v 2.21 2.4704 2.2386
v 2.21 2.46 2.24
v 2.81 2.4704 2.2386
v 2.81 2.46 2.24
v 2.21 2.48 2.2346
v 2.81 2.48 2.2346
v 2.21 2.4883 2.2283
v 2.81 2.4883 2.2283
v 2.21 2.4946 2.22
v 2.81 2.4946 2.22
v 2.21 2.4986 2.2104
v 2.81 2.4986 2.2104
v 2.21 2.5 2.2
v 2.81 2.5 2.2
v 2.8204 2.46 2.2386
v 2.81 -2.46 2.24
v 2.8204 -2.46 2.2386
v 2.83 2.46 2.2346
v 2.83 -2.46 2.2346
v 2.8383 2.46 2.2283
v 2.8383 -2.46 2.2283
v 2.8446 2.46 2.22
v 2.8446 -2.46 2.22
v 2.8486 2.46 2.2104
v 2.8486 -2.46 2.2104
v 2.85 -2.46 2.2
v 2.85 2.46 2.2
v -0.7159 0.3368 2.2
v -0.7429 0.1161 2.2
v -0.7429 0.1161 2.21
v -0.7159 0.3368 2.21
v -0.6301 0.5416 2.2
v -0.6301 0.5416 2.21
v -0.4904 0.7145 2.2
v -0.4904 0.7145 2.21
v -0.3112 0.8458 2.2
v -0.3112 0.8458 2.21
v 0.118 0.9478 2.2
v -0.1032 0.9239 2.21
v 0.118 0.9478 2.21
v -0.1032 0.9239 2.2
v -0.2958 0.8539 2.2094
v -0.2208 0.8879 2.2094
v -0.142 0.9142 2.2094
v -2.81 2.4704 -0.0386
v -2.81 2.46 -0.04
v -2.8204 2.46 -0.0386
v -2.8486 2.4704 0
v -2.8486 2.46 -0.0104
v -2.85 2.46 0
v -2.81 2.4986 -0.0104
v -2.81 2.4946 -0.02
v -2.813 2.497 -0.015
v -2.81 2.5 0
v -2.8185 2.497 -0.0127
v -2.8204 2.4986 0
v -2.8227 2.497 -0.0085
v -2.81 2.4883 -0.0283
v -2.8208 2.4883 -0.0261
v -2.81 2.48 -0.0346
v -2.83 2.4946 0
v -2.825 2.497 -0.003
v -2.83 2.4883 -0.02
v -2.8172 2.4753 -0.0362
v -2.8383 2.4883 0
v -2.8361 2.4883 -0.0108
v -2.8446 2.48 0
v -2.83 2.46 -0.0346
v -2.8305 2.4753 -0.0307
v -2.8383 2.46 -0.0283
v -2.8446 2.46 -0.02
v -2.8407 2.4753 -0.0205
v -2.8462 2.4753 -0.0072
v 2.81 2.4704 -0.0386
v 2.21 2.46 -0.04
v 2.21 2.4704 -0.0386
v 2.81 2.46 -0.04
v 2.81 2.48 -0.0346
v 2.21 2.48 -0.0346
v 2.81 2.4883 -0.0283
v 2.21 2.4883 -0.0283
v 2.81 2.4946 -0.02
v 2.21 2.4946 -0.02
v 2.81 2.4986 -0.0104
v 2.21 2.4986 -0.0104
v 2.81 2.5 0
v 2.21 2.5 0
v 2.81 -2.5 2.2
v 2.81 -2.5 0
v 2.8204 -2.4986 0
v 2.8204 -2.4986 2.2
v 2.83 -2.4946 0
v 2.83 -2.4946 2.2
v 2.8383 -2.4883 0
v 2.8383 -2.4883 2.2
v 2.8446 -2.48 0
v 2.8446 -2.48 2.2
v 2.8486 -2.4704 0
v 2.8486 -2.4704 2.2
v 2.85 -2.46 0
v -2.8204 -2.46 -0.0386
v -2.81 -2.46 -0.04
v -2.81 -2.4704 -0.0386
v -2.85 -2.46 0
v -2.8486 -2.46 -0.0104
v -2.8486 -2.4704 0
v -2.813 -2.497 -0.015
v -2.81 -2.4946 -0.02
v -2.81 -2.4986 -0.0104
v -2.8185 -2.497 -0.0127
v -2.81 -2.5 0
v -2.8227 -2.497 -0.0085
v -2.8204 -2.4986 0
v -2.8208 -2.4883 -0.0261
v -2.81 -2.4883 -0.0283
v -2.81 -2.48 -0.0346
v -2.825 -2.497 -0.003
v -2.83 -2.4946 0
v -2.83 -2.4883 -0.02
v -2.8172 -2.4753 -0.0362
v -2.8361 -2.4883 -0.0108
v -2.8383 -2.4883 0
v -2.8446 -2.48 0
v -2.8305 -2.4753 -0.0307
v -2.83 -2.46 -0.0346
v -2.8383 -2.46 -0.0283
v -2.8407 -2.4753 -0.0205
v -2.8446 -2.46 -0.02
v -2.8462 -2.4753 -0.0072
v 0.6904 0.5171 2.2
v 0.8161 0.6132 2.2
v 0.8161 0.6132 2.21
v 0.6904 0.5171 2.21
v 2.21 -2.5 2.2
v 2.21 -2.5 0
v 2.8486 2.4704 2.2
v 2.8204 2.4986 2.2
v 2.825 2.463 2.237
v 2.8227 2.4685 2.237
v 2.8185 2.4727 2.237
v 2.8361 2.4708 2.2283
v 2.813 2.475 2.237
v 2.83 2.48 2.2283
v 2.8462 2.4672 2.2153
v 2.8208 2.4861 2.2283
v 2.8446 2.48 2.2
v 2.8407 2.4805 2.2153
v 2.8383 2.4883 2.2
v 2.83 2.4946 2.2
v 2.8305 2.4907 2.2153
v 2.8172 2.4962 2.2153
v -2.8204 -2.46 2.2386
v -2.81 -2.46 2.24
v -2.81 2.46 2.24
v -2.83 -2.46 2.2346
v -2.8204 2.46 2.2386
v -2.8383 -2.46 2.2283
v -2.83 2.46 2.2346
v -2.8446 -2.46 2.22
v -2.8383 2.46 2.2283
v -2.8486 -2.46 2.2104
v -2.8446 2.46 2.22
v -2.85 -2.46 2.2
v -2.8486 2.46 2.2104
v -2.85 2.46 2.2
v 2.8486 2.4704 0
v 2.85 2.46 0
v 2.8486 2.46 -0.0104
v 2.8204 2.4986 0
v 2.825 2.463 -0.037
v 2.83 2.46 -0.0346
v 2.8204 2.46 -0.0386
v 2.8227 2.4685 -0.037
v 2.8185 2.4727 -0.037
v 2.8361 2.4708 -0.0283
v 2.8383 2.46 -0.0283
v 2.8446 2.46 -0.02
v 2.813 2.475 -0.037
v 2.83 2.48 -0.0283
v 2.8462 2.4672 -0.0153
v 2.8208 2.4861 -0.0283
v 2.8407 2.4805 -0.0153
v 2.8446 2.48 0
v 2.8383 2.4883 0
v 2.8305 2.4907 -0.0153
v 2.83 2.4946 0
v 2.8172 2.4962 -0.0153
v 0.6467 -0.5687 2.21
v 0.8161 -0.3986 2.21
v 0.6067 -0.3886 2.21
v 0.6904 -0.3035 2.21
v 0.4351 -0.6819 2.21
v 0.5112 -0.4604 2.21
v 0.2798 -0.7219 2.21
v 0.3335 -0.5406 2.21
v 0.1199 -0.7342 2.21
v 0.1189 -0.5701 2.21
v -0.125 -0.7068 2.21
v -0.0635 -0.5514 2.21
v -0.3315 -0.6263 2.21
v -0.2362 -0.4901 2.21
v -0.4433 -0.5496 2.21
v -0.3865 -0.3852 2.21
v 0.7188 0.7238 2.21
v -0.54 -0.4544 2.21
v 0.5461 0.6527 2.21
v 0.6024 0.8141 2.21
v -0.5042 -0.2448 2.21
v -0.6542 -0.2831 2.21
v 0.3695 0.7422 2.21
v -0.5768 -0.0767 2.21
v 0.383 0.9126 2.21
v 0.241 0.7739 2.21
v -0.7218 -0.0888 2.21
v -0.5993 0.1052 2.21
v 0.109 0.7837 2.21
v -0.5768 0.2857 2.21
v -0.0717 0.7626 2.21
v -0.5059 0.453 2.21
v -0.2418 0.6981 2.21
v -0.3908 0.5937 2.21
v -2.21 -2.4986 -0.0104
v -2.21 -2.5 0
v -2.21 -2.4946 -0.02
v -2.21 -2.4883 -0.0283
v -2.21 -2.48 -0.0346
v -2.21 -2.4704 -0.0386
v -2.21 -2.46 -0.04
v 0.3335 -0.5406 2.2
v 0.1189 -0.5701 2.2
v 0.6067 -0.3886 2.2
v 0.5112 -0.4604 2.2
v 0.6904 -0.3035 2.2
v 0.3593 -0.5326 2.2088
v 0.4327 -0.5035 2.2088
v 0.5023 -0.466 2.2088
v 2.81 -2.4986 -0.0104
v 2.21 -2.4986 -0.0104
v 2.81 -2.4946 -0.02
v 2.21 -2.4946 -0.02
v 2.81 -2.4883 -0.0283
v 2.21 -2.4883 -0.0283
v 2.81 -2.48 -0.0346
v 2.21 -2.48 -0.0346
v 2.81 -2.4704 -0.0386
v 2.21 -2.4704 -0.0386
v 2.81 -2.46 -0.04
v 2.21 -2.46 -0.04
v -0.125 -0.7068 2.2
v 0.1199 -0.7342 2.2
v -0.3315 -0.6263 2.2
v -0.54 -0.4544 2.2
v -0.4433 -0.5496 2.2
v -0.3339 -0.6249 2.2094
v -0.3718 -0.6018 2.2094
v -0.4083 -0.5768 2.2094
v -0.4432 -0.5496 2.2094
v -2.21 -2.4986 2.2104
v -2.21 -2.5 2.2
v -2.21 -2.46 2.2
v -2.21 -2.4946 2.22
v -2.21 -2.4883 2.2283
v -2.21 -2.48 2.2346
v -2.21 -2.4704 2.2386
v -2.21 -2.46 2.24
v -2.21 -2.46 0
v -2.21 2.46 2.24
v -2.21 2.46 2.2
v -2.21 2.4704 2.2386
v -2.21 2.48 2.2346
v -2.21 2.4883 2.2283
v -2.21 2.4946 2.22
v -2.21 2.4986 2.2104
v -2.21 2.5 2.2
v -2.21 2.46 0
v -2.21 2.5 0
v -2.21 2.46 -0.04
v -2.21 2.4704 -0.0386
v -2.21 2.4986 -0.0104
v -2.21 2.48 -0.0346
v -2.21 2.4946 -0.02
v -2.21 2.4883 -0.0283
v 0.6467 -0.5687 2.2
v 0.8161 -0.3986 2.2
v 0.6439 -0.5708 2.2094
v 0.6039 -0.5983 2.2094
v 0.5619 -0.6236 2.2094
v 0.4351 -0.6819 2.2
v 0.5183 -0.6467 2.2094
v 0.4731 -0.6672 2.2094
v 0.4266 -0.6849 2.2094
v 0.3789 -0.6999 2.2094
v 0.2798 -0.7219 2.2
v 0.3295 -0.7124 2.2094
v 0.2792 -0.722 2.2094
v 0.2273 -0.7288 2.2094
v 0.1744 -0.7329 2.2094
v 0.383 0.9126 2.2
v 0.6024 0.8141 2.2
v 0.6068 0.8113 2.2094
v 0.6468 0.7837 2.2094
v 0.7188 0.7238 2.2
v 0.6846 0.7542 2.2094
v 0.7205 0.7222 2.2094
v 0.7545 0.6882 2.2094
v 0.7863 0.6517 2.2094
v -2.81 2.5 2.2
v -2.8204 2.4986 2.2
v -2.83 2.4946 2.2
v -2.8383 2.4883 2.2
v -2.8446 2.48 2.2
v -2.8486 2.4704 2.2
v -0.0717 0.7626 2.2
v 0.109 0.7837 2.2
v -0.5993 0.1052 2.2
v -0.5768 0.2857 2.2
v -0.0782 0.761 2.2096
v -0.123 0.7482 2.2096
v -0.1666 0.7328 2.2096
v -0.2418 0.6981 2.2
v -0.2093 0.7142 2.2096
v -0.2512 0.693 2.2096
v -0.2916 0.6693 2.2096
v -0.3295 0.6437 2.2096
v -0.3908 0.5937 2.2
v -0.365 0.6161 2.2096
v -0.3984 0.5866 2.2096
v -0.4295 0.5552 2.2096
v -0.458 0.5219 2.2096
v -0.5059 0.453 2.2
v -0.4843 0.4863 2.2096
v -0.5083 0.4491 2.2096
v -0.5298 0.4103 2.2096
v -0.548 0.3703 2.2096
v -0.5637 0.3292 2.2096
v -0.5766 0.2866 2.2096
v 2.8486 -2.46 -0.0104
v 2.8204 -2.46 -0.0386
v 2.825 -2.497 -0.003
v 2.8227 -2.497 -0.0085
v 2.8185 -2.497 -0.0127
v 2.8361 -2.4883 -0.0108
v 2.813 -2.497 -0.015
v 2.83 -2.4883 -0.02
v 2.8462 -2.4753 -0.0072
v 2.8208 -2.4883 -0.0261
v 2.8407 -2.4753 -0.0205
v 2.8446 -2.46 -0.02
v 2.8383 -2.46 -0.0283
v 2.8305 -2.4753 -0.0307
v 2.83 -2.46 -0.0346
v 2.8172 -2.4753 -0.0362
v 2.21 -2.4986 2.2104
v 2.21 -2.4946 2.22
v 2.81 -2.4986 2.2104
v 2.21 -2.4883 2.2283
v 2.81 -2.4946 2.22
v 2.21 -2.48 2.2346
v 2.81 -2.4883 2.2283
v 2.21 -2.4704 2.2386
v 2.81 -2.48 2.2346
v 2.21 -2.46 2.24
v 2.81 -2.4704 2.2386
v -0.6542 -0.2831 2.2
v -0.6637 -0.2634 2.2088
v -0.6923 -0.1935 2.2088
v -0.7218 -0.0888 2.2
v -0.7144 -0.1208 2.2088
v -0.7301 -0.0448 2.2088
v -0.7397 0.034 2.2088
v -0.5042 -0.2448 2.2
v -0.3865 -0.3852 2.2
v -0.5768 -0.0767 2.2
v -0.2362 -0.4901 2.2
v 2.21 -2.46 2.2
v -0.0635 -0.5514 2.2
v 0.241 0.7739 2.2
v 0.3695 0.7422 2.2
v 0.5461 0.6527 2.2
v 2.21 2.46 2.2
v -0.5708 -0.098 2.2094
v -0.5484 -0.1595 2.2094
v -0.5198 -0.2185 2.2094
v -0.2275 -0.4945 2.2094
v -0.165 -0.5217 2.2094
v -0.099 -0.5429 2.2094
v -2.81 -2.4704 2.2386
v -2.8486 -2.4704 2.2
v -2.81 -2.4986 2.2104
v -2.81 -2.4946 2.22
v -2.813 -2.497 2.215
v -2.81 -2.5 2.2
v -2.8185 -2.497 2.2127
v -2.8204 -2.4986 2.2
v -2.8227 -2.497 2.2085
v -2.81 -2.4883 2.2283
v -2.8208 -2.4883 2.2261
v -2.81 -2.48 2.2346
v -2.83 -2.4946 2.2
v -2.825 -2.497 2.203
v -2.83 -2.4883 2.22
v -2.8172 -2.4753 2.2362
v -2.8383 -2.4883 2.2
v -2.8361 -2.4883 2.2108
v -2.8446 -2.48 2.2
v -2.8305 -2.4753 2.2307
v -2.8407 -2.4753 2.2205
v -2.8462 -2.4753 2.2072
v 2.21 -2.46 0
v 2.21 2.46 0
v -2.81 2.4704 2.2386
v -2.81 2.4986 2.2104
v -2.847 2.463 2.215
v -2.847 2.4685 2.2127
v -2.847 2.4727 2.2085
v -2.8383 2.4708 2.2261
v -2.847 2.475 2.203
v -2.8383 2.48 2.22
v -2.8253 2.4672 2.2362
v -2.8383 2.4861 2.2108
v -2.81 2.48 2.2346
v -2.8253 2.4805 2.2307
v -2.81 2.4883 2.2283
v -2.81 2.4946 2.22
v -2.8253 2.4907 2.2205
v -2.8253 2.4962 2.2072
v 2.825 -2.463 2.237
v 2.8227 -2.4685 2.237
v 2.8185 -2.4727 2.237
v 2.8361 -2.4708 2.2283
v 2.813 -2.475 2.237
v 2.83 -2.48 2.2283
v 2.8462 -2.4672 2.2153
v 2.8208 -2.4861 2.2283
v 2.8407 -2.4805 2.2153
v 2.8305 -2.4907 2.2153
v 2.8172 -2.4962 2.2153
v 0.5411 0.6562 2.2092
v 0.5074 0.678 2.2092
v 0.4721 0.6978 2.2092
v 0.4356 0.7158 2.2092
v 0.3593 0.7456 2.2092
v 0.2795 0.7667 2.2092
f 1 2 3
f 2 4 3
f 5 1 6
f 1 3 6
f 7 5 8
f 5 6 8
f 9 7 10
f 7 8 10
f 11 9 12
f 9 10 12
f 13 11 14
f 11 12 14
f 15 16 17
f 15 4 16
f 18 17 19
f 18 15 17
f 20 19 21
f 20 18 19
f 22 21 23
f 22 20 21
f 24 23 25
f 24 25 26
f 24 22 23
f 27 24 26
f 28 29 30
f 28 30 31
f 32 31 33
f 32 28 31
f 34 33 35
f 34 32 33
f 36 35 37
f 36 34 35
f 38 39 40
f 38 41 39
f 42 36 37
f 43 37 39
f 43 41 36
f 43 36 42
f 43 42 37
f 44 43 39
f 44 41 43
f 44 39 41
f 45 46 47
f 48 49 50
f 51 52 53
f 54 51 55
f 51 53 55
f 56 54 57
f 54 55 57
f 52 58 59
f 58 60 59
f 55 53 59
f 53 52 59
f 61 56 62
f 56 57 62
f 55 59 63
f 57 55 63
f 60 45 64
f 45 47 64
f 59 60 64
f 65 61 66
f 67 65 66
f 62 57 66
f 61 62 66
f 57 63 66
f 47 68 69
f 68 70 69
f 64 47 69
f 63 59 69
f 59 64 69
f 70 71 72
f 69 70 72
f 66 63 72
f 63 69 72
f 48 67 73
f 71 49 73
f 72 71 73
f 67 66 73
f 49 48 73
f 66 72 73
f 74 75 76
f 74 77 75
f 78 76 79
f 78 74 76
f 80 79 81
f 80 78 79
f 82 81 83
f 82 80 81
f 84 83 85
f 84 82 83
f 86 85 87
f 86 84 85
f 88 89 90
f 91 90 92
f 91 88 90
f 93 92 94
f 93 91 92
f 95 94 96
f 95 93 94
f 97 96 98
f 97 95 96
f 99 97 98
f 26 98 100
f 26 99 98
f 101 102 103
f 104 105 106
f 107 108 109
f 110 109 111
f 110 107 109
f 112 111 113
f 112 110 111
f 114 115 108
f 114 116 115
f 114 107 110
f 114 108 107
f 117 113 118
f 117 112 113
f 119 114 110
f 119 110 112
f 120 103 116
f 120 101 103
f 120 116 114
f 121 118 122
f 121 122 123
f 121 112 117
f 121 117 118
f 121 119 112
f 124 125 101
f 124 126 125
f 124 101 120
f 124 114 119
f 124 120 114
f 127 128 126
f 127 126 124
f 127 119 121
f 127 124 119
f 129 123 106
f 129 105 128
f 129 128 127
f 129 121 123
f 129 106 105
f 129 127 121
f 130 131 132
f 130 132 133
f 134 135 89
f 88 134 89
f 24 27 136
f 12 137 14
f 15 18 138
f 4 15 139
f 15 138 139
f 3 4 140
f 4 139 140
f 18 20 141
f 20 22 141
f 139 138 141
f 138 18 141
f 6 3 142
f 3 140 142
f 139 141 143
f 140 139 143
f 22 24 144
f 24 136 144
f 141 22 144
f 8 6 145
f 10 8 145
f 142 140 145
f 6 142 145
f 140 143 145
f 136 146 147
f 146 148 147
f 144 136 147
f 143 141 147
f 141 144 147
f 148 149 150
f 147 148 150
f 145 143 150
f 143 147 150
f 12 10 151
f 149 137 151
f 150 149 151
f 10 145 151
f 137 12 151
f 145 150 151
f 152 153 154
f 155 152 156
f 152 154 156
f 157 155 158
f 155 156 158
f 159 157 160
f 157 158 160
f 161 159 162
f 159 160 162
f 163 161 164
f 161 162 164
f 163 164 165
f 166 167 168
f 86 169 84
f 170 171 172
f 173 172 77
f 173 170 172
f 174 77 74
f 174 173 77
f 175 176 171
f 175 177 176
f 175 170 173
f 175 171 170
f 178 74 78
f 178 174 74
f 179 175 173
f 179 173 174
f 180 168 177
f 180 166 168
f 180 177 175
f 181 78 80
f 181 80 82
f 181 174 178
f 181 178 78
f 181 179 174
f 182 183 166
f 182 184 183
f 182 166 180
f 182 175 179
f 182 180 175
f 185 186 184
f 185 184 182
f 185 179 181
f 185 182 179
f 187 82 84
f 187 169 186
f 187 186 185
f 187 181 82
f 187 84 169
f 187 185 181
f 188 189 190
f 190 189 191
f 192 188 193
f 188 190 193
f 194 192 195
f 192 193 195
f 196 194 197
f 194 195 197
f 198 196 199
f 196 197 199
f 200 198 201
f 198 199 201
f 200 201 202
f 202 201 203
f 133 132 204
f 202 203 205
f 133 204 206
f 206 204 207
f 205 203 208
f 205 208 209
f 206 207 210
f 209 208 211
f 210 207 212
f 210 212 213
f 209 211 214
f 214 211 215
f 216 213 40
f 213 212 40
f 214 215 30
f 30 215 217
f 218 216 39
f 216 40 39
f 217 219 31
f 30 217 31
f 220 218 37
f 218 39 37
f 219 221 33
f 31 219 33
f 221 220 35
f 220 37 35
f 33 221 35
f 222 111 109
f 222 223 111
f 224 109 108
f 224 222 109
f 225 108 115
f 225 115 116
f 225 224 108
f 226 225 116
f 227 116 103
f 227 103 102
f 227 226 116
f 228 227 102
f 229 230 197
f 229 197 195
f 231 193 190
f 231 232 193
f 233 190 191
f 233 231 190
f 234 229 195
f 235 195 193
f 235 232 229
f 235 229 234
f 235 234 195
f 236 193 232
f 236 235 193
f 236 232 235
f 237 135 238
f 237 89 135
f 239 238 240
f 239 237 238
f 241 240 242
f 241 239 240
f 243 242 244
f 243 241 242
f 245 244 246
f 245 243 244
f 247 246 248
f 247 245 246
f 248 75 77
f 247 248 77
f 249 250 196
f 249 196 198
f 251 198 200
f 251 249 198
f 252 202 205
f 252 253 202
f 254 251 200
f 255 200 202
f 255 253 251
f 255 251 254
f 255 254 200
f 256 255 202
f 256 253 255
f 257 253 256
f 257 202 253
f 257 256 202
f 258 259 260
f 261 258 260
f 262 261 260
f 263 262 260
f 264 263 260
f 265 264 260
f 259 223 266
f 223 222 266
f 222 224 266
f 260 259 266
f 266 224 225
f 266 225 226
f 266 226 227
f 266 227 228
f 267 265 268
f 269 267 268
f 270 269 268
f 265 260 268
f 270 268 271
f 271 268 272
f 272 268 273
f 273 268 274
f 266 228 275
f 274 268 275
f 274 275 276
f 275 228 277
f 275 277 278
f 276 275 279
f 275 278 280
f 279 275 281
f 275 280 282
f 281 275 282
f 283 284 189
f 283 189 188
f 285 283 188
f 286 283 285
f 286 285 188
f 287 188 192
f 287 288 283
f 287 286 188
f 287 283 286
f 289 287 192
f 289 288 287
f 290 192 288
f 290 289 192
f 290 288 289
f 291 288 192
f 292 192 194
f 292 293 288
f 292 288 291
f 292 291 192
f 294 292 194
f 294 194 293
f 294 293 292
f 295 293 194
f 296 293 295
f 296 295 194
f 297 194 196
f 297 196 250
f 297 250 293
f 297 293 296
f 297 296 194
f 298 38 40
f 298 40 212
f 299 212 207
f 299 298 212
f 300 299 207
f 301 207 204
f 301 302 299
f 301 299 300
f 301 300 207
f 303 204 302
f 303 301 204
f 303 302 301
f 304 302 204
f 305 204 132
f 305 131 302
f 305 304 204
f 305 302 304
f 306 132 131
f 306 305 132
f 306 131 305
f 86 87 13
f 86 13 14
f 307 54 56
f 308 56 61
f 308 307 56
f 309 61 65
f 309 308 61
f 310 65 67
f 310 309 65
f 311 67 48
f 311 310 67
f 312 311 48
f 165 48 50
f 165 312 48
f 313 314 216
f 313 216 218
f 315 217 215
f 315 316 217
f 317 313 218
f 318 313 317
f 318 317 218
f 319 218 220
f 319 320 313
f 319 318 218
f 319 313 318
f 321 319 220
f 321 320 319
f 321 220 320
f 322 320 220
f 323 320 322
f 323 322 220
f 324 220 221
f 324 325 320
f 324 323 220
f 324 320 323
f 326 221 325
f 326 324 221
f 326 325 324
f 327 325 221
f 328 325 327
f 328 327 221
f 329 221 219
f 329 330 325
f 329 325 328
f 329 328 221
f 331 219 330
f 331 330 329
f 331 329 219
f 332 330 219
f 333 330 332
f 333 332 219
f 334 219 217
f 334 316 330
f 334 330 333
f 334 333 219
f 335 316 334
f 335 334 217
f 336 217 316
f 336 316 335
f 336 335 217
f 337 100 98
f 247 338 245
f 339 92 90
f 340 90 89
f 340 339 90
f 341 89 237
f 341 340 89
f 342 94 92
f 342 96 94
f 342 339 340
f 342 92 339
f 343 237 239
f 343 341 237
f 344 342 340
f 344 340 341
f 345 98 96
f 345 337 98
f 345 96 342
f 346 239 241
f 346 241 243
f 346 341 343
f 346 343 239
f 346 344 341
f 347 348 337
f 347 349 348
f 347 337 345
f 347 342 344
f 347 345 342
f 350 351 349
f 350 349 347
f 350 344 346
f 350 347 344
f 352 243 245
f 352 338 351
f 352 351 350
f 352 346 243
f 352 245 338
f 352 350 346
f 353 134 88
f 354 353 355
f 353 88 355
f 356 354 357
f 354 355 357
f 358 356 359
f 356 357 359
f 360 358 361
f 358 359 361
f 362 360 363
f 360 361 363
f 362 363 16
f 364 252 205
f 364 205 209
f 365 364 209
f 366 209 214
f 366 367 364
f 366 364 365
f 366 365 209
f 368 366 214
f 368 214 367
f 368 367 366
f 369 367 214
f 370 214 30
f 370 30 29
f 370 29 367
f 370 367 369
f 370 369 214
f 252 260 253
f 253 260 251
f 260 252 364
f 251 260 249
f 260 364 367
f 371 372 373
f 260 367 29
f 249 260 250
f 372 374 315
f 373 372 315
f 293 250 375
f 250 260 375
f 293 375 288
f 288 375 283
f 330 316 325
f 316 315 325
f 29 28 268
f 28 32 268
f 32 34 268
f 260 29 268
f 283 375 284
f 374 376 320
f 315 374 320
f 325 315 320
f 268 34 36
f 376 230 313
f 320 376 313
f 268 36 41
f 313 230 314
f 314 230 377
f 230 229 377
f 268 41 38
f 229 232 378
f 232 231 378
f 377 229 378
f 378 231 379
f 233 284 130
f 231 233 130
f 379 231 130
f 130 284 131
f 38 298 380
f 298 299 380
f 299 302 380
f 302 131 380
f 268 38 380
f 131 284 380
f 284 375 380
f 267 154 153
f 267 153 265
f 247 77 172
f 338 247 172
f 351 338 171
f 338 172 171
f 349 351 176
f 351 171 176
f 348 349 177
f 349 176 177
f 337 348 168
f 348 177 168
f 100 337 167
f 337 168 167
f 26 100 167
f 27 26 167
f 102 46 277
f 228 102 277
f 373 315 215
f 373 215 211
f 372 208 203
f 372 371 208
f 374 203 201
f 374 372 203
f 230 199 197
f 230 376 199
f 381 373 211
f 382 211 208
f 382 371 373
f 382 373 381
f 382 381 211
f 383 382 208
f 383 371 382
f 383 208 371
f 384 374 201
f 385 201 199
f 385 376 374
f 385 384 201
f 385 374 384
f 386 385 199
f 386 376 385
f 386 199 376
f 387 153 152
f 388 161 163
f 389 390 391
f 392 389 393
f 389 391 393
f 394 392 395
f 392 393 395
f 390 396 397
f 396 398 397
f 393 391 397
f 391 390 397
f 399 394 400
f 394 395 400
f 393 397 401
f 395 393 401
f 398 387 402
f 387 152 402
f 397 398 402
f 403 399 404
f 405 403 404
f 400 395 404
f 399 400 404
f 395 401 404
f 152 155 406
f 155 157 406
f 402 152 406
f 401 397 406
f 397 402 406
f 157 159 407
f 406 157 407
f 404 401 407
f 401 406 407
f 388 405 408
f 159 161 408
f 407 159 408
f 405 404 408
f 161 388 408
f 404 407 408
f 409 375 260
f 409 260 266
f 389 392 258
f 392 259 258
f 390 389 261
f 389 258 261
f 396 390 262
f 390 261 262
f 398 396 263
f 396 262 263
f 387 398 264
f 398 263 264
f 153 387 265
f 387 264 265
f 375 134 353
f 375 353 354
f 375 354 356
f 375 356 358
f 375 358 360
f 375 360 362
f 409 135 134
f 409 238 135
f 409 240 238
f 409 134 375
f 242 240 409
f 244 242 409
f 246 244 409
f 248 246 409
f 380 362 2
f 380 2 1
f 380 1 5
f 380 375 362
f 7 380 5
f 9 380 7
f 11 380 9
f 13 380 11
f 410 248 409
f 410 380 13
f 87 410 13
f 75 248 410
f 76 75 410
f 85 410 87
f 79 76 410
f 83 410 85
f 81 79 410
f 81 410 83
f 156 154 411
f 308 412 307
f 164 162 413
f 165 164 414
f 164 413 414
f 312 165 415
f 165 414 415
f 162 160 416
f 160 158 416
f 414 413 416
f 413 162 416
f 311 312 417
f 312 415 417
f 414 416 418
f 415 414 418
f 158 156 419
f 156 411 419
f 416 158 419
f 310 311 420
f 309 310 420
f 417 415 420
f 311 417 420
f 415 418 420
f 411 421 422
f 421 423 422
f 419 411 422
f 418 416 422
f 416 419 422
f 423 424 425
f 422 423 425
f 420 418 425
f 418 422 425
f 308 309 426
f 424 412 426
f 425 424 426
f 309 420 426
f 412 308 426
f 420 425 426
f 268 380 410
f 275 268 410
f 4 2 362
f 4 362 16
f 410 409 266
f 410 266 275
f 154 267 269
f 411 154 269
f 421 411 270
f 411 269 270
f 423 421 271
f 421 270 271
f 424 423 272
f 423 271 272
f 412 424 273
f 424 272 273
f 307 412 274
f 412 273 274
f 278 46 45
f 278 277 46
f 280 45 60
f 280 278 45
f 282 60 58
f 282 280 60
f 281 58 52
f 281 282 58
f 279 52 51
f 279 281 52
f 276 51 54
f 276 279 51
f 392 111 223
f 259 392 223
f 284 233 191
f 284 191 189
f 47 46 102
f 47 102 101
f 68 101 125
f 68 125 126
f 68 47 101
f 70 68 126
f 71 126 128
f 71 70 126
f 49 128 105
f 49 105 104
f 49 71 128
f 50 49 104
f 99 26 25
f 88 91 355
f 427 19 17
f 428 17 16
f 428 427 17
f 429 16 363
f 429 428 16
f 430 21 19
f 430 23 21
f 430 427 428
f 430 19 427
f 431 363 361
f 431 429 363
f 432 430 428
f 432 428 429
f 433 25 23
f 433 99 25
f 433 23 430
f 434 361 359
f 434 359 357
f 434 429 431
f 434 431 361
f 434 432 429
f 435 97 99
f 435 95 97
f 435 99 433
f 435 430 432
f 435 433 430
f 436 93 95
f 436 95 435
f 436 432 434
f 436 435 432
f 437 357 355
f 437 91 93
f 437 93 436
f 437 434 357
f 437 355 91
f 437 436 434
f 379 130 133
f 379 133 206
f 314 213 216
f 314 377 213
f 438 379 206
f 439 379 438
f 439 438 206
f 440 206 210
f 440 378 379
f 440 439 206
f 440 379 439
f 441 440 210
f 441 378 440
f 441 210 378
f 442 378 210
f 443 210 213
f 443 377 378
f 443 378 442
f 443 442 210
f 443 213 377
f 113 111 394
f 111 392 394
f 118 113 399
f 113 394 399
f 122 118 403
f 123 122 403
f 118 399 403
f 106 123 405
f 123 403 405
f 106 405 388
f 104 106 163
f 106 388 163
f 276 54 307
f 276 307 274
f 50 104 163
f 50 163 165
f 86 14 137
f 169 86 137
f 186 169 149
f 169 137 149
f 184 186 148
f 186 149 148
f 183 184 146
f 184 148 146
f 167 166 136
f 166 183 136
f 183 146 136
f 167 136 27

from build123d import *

# Parameters (mm, degrees)
EXTRUDE_1_DEPTH        = 2.24
EXTRUDE_1_DEPTH_BACK   = 0.04
SKETCH_3_W             = 0.64
SKETCH_3_H             = 5
EXTRUDE_1_2_DEPTH      = 2.24
EXTRUDE_1_2_DEPTH_BACK = 0.04
SKETCH_5_W             = 2.2
SKETCH_5_H             = 4.92
EXTRUDE_3_DEPTH        = 2.26
FILLET_3_R             = 0.04
EXTRUDE_4_DEPTH        = 0.01


with BuildPart() as part:
    # 草图3 → 凸台-拉伸1 (new, two sides: drawn at the far end of the back side and taken through both)
    with BuildSketch(Plane.XY.offset(-EXTRUDE_1_DEPTH_BACK)):
        with Locations((-2.53, 0)):
            Rectangle(SKETCH_3_W, SKETCH_3_H)
    extrude(amount=EXTRUDE_1_DEPTH + EXTRUDE_1_DEPTH_BACK)



with BuildPart() as body_2:
    # 草图3 → Extrude 1 2 (new, two sides: drawn at the far end of the back side and taken through both)
    with BuildSketch(Plane.XY.offset(-EXTRUDE_1_2_DEPTH_BACK)):
        with Locations((2.53, 0)):
            Rectangle(SKETCH_3_W, SKETCH_3_H)
    extrude(amount=EXTRUDE_1_2_DEPTH + EXTRUDE_1_2_DEPTH_BACK)


with BuildPart() as part_1:
    add(part.part)

    add(body_2.part)  # 凸台-拉伸3 merges body 2
    # 草图5 → 凸台-拉伸3 (add, symmetric)
    with BuildSketch(Plane(origin=(0, 0, 0), x_dir=(0, 0, -1), z_dir=(1, 0, 0))):
        with Locations((-1.1, 0)):
            Rectangle(SKETCH_5_W, SKETCH_5_H)
    extrude(amount=EXTRUDE_3_DEPTH, both=True)

    # 圆角3
    fillet_3_edges = [part_1.edges().sort_by_distance(p)[0] for p in [
        (-2.85, 0, -0.04),
        (-2.53, 2.5, 2.24),
        (-2.53, -2.5, -0.04),
        (-2.85, 0, 2.24),
        (-2.53, -2.5, 2.24),
        (2.85, 2.5, 1.1),
        (2.85, 0, -0.04),
        (2.85, -2.5, 1.1),
        (2.53, -2.5, -0.04),
        (2.53, 2.5, -0.04),
        (2.85, 0, 2.24),
        (2.53, 2.5, 2.24),
        (2.53, -2.5, 2.24),
        (-2.53, 2.5, -0.04),
        (-2.85, -2.5, 1.1),
        (-2.85, 2.5, 1.1),
    ]]
    fillet(fillet_3_edges, radius=FILLET_3_R)

    # 草图6 → 凸台-拉伸4 (add)
    with BuildSketch(Plane.XY.offset(2.2)):
        with BuildLine():
            Line((0.816058378, 0.613216546), (0.690417352, 0.5170627))
            add(Edge.make_bspline(
                [(0.690417352, 0.5170627), (0.681454661, 0.527744286), (0.663650113, 0.548963447), (0.635005907, 0.578759811), (0.605153727, 0.606675359), (0.574104986, 0.632843075), (0.541300817, 0.656347882), (0.50753588, 0.678414672), (0.472245345, 0.69819421), (0.423444553, 0.722177289), (0.359605536, 0.747204103), (0.279242181, 0.768188437), (0.195351393, 0.781546689), (0.138118205, 0.782993473), (0.109007096, 0.783729366)],
                knots=[0, 0, 0, 0, 0.757959112, 1.505699292, 2.245454638, 2.979532153, 3.711538275, 4.438200793, 5.171680507, 5.909471876, 7.393775596, 8.890124382, 10.418191784, 12, 12, 12, 12], degree=3))
            add(Edge.make_bspline(
                [(0.109007096, 0.783729366), (0.092969016, 0.783544698), (0.061041705, 0.783177075), (0.013659546, 0.778327189), (-0.032837849, 0.771510636), (-0.078420233, 0.761396202), (-0.123029586, 0.748608719), (-0.166957541, 0.73332853), (-0.209568101, 0.71442346), (-0.251450724, 0.693528256), (-0.291578363, 0.669927138), (-0.329546385, 0.644183892), (-0.365216313, 0.61658659), (-0.398616365, 0.587031799), (-0.429780684, 0.555652617), (-0.458483455, 0.522114632), (-0.484625356, 0.486525067), (-0.508724568, 0.449353224), (-0.530307532, 0.410707376), (-0.548378334, 0.370444487), (-0.564380675, 0.32925404), (-0.577043186, 0.286670652), (-0.587065822, 0.242993959), (-0.593981326, 0.198106742), (-0.598776055, 0.152102774), (-0.59914185, 0.120921374), (-0.599326237, 0.105203725)],
                knots=[0, 0, 0, 0, 1.054917814, 2.100044995, 3.131103042, 4.146048494, 5.169673617, 6.183595914, 7.203665975, 8.234915748, 9.262203917, 10.264457458, 11.251630812, 12.227803204, 13.197192746, 14.159520551, 15.12972552, 16.100847026, 17.073214652, 18.039054194, 19.002613845, 19.979014051, 20.95965708, 21.949030935, 22.966165397, 24, 24, 24, 24], degree=3))
            add(Edge.make_bspline(
                [(-0.599326237, 0.105203725), (-0.598749406, 0.081555122), (-0.597616874, 0.035124226), (-0.587537635, -0.032885196), (-0.572221022, -0.098037504), (-0.54926533, -0.159925432), (-0.520959478, -0.21931211), (-0.485192341, -0.275192728), (-0.443767638, -0.328411729), (-0.396099332, -0.377711363), (-0.343799531, -0.422746208), (-0.2876862, -0.462403617), (-0.227899097, -0.495461849), (-0.165098352, -0.522970853), (-0.0988007, -0.544116786), (-0.029125361, -0.559003242), (0.043776122, -0.568713953), (0.093590705, -0.569643639), (0.118942993, -0.570116787)],
                knots=[0, 0, 0, 0, 1.029171465, 2.020641659, 2.987623507, 3.938342917, 4.889210282, 5.84687017, 6.821220943, 7.821438502, 8.827599549, 9.822697543, 10.807740252, 11.797342354, 12.80366471, 13.83203677, 14.896651826, 16, 16, 16, 16], degree=3))
            add(Edge.make_bspline(
                [(0.118942993, -0.570116787), (0.146875651, -0.569344774), (0.201853804, -0.567825266), (0.282479187, -0.554952467), (0.359661252, -0.534080276), (0.433404148, -0.504869797), (0.503499987, -0.466897094), (0.57005846, -0.420863779), (0.633135749, -0.366331969), (0.671065478, -0.324693968), (0.690417352, -0.303450121)],
                knots=[0, 0, 0, 0, 1.028121516, 2.023589091, 2.998037872, 3.967518031, 4.937445131, 5.927275754, 6.942489185, 8, 8, 8, 8], degree=3))
            Line((0.690417352, -0.303450121), (0.816058378, -0.398642428))
            add(Edge.make_bspline(
                [(0.816058378, -0.398642428), (0.805947242, -0.411688578), (0.785773402, -0.437718386), (0.75310688, -0.474414025), (0.718694401, -0.508930156), (0.682280362, -0.540988497), (0.644283658, -0.571230538), (0.604022029, -0.59879709), (0.562024757, -0.624072923), (0.518434138, -0.647216659), (0.473296487, -0.667750258), (0.426665888, -0.685329123), (0.378743339, -0.70047193), (0.329526649, -0.712929958), (0.278913732, -0.722653882), (0.22708723, -0.729154305), (0.173935287, -0.733607752), (0.138076351, -0.734013656), (0.119904532, -0.734219352)],
                knots=[0, 0, 0, 0, 0.986787822, 1.968848986, 2.935600012, 3.899624008, 4.868462664, 5.837806735, 6.815139263, 7.798259679, 8.787526145, 9.778297419, 10.776456485, 11.791383307, 12.812564526, 13.85620153, 14.913611965, 16, 16, 16, 16], degree=3))
            add(Edge.make_bspline(
                [(0.119904532, -0.734219352), (0.102695998, -0.734099583), (0.068668254, -0.733862757), (0.018428825, -0.730026338), (-0.030480698, -0.724792172), (-0.077920527, -0.716910969), (-0.124149544, -0.7076107), (-0.168748668, -0.69514384), (-0.212156764, -0.681178506), (-0.254199434, -0.664764798), (-0.29491244, -0.646243115), (-0.334164468, -0.62530983), (-0.371937466, -0.602140978), (-0.408602801, -0.577247259), (-0.443618839, -0.549829064), (-0.477289022, -0.520267174), (-0.509802154, -0.488661226), (-0.529917667, -0.465870436), (-0.540031366, -0.454411659)],
                knots=[0, 0, 0, 0, 1.114604814, 2.203992996, 3.262667896, 4.300477797, 5.318619304, 6.316056647, 7.298880507, 8.271930387, 9.238335007, 10.195173496, 11.151986948, 12.108099108, 13.064862484, 14.031167946, 15.010108607, 16, 16, 16, 16], degree=3))
            add(Edge.make_bspline(
                [(-0.540031366, -0.454411659), (-0.556230517, -0.434507116), (-0.588433249, -0.394938334), (-0.629633562, -0.3308076), (-0.664901015, -0.263850704), (-0.693415722, -0.193715879), (-0.715707257, -0.120560502), (-0.731150089, -0.044347696), (-0.741185108, 0.034851363), (-0.742332669, 0.08871961), (-0.742915981, 0.116101161)],
                knots=[0, 0, 0, 0, 0.994628077, 1.977248131, 2.950237994, 3.925870899, 4.908910175, 5.911660606, 6.938484602, 8, 8, 8, 8], degree=3))
            add(Edge.make_bspline(
                [(-0.742915981, 0.116101161), (-0.742205035, 0.144880797), (-0.740806294, 0.201502934), (-0.728922502, 0.284599599), (-0.709805338, 0.364211667), (-0.682652475, 0.440190521), (-0.648227171, 0.512935792), (-0.605700719, 0.581891772), (-0.555567168, 0.647499451), (-0.498219709, 0.708763338), (-0.435331784, 0.764781327), (-0.367986041, 0.814064163), (-0.296314293, 0.855077885), (-0.221106133, 0.889361845), (-0.141798393, 0.9157136), (-0.058560281, 0.934160771), (0.028451794, 0.945642881), (0.087817475, 0.947094405), (0.117981455, 0.947831931)],
                knots=[0, 0, 0, 0, 1.032925535, 2.032216505, 3.007276963, 3.968222605, 4.92396291, 5.891752235, 6.871517503, 7.883894988, 8.900124299, 9.891468569, 10.874487609, 11.85992873, 12.854644235, 13.869047385, 14.917252991, 16, 16, 16, 16], degree=3))
            add(Edge.make_bspline(
                [(0.117981455, 0.947831931), (0.136365214, 0.947611525), (0.172754012, 0.947175253), (0.226583796, 0.942921017), (0.278991717, 0.935829082), (0.33001388, 0.926176022), (0.379898505, 0.914195532), (0.428264329, 0.898588538), (0.475395158, 0.880743267), (0.520993744, 0.860190825), (0.56484131, 0.837120315), (0.606924198, 0.811787459), (0.646908134, 0.784223662), (0.685074465, 0.754663353), (0.720784733, 0.722481155), (0.755052837, 0.688562254), (0.786715044, 0.651929648), (0.806259362, 0.626144536), (0.816058378, 0.613216546)],
                knots=[0, 0, 0, 0, 1.096760587, 2.17092713, 3.219439832, 4.250915756, 5.268269357, 6.278326846, 7.281116186, 8.274029601, 9.260640565, 10.235837813, 11.203064059, 12.156899882, 13.114053108, 14.069676657, 15.032185724, 16, 16, 16, 16], degree=3))
        make_face()
    extrude(amount=EXTRUDE_4_DEPTH)


solid = part_1.part
